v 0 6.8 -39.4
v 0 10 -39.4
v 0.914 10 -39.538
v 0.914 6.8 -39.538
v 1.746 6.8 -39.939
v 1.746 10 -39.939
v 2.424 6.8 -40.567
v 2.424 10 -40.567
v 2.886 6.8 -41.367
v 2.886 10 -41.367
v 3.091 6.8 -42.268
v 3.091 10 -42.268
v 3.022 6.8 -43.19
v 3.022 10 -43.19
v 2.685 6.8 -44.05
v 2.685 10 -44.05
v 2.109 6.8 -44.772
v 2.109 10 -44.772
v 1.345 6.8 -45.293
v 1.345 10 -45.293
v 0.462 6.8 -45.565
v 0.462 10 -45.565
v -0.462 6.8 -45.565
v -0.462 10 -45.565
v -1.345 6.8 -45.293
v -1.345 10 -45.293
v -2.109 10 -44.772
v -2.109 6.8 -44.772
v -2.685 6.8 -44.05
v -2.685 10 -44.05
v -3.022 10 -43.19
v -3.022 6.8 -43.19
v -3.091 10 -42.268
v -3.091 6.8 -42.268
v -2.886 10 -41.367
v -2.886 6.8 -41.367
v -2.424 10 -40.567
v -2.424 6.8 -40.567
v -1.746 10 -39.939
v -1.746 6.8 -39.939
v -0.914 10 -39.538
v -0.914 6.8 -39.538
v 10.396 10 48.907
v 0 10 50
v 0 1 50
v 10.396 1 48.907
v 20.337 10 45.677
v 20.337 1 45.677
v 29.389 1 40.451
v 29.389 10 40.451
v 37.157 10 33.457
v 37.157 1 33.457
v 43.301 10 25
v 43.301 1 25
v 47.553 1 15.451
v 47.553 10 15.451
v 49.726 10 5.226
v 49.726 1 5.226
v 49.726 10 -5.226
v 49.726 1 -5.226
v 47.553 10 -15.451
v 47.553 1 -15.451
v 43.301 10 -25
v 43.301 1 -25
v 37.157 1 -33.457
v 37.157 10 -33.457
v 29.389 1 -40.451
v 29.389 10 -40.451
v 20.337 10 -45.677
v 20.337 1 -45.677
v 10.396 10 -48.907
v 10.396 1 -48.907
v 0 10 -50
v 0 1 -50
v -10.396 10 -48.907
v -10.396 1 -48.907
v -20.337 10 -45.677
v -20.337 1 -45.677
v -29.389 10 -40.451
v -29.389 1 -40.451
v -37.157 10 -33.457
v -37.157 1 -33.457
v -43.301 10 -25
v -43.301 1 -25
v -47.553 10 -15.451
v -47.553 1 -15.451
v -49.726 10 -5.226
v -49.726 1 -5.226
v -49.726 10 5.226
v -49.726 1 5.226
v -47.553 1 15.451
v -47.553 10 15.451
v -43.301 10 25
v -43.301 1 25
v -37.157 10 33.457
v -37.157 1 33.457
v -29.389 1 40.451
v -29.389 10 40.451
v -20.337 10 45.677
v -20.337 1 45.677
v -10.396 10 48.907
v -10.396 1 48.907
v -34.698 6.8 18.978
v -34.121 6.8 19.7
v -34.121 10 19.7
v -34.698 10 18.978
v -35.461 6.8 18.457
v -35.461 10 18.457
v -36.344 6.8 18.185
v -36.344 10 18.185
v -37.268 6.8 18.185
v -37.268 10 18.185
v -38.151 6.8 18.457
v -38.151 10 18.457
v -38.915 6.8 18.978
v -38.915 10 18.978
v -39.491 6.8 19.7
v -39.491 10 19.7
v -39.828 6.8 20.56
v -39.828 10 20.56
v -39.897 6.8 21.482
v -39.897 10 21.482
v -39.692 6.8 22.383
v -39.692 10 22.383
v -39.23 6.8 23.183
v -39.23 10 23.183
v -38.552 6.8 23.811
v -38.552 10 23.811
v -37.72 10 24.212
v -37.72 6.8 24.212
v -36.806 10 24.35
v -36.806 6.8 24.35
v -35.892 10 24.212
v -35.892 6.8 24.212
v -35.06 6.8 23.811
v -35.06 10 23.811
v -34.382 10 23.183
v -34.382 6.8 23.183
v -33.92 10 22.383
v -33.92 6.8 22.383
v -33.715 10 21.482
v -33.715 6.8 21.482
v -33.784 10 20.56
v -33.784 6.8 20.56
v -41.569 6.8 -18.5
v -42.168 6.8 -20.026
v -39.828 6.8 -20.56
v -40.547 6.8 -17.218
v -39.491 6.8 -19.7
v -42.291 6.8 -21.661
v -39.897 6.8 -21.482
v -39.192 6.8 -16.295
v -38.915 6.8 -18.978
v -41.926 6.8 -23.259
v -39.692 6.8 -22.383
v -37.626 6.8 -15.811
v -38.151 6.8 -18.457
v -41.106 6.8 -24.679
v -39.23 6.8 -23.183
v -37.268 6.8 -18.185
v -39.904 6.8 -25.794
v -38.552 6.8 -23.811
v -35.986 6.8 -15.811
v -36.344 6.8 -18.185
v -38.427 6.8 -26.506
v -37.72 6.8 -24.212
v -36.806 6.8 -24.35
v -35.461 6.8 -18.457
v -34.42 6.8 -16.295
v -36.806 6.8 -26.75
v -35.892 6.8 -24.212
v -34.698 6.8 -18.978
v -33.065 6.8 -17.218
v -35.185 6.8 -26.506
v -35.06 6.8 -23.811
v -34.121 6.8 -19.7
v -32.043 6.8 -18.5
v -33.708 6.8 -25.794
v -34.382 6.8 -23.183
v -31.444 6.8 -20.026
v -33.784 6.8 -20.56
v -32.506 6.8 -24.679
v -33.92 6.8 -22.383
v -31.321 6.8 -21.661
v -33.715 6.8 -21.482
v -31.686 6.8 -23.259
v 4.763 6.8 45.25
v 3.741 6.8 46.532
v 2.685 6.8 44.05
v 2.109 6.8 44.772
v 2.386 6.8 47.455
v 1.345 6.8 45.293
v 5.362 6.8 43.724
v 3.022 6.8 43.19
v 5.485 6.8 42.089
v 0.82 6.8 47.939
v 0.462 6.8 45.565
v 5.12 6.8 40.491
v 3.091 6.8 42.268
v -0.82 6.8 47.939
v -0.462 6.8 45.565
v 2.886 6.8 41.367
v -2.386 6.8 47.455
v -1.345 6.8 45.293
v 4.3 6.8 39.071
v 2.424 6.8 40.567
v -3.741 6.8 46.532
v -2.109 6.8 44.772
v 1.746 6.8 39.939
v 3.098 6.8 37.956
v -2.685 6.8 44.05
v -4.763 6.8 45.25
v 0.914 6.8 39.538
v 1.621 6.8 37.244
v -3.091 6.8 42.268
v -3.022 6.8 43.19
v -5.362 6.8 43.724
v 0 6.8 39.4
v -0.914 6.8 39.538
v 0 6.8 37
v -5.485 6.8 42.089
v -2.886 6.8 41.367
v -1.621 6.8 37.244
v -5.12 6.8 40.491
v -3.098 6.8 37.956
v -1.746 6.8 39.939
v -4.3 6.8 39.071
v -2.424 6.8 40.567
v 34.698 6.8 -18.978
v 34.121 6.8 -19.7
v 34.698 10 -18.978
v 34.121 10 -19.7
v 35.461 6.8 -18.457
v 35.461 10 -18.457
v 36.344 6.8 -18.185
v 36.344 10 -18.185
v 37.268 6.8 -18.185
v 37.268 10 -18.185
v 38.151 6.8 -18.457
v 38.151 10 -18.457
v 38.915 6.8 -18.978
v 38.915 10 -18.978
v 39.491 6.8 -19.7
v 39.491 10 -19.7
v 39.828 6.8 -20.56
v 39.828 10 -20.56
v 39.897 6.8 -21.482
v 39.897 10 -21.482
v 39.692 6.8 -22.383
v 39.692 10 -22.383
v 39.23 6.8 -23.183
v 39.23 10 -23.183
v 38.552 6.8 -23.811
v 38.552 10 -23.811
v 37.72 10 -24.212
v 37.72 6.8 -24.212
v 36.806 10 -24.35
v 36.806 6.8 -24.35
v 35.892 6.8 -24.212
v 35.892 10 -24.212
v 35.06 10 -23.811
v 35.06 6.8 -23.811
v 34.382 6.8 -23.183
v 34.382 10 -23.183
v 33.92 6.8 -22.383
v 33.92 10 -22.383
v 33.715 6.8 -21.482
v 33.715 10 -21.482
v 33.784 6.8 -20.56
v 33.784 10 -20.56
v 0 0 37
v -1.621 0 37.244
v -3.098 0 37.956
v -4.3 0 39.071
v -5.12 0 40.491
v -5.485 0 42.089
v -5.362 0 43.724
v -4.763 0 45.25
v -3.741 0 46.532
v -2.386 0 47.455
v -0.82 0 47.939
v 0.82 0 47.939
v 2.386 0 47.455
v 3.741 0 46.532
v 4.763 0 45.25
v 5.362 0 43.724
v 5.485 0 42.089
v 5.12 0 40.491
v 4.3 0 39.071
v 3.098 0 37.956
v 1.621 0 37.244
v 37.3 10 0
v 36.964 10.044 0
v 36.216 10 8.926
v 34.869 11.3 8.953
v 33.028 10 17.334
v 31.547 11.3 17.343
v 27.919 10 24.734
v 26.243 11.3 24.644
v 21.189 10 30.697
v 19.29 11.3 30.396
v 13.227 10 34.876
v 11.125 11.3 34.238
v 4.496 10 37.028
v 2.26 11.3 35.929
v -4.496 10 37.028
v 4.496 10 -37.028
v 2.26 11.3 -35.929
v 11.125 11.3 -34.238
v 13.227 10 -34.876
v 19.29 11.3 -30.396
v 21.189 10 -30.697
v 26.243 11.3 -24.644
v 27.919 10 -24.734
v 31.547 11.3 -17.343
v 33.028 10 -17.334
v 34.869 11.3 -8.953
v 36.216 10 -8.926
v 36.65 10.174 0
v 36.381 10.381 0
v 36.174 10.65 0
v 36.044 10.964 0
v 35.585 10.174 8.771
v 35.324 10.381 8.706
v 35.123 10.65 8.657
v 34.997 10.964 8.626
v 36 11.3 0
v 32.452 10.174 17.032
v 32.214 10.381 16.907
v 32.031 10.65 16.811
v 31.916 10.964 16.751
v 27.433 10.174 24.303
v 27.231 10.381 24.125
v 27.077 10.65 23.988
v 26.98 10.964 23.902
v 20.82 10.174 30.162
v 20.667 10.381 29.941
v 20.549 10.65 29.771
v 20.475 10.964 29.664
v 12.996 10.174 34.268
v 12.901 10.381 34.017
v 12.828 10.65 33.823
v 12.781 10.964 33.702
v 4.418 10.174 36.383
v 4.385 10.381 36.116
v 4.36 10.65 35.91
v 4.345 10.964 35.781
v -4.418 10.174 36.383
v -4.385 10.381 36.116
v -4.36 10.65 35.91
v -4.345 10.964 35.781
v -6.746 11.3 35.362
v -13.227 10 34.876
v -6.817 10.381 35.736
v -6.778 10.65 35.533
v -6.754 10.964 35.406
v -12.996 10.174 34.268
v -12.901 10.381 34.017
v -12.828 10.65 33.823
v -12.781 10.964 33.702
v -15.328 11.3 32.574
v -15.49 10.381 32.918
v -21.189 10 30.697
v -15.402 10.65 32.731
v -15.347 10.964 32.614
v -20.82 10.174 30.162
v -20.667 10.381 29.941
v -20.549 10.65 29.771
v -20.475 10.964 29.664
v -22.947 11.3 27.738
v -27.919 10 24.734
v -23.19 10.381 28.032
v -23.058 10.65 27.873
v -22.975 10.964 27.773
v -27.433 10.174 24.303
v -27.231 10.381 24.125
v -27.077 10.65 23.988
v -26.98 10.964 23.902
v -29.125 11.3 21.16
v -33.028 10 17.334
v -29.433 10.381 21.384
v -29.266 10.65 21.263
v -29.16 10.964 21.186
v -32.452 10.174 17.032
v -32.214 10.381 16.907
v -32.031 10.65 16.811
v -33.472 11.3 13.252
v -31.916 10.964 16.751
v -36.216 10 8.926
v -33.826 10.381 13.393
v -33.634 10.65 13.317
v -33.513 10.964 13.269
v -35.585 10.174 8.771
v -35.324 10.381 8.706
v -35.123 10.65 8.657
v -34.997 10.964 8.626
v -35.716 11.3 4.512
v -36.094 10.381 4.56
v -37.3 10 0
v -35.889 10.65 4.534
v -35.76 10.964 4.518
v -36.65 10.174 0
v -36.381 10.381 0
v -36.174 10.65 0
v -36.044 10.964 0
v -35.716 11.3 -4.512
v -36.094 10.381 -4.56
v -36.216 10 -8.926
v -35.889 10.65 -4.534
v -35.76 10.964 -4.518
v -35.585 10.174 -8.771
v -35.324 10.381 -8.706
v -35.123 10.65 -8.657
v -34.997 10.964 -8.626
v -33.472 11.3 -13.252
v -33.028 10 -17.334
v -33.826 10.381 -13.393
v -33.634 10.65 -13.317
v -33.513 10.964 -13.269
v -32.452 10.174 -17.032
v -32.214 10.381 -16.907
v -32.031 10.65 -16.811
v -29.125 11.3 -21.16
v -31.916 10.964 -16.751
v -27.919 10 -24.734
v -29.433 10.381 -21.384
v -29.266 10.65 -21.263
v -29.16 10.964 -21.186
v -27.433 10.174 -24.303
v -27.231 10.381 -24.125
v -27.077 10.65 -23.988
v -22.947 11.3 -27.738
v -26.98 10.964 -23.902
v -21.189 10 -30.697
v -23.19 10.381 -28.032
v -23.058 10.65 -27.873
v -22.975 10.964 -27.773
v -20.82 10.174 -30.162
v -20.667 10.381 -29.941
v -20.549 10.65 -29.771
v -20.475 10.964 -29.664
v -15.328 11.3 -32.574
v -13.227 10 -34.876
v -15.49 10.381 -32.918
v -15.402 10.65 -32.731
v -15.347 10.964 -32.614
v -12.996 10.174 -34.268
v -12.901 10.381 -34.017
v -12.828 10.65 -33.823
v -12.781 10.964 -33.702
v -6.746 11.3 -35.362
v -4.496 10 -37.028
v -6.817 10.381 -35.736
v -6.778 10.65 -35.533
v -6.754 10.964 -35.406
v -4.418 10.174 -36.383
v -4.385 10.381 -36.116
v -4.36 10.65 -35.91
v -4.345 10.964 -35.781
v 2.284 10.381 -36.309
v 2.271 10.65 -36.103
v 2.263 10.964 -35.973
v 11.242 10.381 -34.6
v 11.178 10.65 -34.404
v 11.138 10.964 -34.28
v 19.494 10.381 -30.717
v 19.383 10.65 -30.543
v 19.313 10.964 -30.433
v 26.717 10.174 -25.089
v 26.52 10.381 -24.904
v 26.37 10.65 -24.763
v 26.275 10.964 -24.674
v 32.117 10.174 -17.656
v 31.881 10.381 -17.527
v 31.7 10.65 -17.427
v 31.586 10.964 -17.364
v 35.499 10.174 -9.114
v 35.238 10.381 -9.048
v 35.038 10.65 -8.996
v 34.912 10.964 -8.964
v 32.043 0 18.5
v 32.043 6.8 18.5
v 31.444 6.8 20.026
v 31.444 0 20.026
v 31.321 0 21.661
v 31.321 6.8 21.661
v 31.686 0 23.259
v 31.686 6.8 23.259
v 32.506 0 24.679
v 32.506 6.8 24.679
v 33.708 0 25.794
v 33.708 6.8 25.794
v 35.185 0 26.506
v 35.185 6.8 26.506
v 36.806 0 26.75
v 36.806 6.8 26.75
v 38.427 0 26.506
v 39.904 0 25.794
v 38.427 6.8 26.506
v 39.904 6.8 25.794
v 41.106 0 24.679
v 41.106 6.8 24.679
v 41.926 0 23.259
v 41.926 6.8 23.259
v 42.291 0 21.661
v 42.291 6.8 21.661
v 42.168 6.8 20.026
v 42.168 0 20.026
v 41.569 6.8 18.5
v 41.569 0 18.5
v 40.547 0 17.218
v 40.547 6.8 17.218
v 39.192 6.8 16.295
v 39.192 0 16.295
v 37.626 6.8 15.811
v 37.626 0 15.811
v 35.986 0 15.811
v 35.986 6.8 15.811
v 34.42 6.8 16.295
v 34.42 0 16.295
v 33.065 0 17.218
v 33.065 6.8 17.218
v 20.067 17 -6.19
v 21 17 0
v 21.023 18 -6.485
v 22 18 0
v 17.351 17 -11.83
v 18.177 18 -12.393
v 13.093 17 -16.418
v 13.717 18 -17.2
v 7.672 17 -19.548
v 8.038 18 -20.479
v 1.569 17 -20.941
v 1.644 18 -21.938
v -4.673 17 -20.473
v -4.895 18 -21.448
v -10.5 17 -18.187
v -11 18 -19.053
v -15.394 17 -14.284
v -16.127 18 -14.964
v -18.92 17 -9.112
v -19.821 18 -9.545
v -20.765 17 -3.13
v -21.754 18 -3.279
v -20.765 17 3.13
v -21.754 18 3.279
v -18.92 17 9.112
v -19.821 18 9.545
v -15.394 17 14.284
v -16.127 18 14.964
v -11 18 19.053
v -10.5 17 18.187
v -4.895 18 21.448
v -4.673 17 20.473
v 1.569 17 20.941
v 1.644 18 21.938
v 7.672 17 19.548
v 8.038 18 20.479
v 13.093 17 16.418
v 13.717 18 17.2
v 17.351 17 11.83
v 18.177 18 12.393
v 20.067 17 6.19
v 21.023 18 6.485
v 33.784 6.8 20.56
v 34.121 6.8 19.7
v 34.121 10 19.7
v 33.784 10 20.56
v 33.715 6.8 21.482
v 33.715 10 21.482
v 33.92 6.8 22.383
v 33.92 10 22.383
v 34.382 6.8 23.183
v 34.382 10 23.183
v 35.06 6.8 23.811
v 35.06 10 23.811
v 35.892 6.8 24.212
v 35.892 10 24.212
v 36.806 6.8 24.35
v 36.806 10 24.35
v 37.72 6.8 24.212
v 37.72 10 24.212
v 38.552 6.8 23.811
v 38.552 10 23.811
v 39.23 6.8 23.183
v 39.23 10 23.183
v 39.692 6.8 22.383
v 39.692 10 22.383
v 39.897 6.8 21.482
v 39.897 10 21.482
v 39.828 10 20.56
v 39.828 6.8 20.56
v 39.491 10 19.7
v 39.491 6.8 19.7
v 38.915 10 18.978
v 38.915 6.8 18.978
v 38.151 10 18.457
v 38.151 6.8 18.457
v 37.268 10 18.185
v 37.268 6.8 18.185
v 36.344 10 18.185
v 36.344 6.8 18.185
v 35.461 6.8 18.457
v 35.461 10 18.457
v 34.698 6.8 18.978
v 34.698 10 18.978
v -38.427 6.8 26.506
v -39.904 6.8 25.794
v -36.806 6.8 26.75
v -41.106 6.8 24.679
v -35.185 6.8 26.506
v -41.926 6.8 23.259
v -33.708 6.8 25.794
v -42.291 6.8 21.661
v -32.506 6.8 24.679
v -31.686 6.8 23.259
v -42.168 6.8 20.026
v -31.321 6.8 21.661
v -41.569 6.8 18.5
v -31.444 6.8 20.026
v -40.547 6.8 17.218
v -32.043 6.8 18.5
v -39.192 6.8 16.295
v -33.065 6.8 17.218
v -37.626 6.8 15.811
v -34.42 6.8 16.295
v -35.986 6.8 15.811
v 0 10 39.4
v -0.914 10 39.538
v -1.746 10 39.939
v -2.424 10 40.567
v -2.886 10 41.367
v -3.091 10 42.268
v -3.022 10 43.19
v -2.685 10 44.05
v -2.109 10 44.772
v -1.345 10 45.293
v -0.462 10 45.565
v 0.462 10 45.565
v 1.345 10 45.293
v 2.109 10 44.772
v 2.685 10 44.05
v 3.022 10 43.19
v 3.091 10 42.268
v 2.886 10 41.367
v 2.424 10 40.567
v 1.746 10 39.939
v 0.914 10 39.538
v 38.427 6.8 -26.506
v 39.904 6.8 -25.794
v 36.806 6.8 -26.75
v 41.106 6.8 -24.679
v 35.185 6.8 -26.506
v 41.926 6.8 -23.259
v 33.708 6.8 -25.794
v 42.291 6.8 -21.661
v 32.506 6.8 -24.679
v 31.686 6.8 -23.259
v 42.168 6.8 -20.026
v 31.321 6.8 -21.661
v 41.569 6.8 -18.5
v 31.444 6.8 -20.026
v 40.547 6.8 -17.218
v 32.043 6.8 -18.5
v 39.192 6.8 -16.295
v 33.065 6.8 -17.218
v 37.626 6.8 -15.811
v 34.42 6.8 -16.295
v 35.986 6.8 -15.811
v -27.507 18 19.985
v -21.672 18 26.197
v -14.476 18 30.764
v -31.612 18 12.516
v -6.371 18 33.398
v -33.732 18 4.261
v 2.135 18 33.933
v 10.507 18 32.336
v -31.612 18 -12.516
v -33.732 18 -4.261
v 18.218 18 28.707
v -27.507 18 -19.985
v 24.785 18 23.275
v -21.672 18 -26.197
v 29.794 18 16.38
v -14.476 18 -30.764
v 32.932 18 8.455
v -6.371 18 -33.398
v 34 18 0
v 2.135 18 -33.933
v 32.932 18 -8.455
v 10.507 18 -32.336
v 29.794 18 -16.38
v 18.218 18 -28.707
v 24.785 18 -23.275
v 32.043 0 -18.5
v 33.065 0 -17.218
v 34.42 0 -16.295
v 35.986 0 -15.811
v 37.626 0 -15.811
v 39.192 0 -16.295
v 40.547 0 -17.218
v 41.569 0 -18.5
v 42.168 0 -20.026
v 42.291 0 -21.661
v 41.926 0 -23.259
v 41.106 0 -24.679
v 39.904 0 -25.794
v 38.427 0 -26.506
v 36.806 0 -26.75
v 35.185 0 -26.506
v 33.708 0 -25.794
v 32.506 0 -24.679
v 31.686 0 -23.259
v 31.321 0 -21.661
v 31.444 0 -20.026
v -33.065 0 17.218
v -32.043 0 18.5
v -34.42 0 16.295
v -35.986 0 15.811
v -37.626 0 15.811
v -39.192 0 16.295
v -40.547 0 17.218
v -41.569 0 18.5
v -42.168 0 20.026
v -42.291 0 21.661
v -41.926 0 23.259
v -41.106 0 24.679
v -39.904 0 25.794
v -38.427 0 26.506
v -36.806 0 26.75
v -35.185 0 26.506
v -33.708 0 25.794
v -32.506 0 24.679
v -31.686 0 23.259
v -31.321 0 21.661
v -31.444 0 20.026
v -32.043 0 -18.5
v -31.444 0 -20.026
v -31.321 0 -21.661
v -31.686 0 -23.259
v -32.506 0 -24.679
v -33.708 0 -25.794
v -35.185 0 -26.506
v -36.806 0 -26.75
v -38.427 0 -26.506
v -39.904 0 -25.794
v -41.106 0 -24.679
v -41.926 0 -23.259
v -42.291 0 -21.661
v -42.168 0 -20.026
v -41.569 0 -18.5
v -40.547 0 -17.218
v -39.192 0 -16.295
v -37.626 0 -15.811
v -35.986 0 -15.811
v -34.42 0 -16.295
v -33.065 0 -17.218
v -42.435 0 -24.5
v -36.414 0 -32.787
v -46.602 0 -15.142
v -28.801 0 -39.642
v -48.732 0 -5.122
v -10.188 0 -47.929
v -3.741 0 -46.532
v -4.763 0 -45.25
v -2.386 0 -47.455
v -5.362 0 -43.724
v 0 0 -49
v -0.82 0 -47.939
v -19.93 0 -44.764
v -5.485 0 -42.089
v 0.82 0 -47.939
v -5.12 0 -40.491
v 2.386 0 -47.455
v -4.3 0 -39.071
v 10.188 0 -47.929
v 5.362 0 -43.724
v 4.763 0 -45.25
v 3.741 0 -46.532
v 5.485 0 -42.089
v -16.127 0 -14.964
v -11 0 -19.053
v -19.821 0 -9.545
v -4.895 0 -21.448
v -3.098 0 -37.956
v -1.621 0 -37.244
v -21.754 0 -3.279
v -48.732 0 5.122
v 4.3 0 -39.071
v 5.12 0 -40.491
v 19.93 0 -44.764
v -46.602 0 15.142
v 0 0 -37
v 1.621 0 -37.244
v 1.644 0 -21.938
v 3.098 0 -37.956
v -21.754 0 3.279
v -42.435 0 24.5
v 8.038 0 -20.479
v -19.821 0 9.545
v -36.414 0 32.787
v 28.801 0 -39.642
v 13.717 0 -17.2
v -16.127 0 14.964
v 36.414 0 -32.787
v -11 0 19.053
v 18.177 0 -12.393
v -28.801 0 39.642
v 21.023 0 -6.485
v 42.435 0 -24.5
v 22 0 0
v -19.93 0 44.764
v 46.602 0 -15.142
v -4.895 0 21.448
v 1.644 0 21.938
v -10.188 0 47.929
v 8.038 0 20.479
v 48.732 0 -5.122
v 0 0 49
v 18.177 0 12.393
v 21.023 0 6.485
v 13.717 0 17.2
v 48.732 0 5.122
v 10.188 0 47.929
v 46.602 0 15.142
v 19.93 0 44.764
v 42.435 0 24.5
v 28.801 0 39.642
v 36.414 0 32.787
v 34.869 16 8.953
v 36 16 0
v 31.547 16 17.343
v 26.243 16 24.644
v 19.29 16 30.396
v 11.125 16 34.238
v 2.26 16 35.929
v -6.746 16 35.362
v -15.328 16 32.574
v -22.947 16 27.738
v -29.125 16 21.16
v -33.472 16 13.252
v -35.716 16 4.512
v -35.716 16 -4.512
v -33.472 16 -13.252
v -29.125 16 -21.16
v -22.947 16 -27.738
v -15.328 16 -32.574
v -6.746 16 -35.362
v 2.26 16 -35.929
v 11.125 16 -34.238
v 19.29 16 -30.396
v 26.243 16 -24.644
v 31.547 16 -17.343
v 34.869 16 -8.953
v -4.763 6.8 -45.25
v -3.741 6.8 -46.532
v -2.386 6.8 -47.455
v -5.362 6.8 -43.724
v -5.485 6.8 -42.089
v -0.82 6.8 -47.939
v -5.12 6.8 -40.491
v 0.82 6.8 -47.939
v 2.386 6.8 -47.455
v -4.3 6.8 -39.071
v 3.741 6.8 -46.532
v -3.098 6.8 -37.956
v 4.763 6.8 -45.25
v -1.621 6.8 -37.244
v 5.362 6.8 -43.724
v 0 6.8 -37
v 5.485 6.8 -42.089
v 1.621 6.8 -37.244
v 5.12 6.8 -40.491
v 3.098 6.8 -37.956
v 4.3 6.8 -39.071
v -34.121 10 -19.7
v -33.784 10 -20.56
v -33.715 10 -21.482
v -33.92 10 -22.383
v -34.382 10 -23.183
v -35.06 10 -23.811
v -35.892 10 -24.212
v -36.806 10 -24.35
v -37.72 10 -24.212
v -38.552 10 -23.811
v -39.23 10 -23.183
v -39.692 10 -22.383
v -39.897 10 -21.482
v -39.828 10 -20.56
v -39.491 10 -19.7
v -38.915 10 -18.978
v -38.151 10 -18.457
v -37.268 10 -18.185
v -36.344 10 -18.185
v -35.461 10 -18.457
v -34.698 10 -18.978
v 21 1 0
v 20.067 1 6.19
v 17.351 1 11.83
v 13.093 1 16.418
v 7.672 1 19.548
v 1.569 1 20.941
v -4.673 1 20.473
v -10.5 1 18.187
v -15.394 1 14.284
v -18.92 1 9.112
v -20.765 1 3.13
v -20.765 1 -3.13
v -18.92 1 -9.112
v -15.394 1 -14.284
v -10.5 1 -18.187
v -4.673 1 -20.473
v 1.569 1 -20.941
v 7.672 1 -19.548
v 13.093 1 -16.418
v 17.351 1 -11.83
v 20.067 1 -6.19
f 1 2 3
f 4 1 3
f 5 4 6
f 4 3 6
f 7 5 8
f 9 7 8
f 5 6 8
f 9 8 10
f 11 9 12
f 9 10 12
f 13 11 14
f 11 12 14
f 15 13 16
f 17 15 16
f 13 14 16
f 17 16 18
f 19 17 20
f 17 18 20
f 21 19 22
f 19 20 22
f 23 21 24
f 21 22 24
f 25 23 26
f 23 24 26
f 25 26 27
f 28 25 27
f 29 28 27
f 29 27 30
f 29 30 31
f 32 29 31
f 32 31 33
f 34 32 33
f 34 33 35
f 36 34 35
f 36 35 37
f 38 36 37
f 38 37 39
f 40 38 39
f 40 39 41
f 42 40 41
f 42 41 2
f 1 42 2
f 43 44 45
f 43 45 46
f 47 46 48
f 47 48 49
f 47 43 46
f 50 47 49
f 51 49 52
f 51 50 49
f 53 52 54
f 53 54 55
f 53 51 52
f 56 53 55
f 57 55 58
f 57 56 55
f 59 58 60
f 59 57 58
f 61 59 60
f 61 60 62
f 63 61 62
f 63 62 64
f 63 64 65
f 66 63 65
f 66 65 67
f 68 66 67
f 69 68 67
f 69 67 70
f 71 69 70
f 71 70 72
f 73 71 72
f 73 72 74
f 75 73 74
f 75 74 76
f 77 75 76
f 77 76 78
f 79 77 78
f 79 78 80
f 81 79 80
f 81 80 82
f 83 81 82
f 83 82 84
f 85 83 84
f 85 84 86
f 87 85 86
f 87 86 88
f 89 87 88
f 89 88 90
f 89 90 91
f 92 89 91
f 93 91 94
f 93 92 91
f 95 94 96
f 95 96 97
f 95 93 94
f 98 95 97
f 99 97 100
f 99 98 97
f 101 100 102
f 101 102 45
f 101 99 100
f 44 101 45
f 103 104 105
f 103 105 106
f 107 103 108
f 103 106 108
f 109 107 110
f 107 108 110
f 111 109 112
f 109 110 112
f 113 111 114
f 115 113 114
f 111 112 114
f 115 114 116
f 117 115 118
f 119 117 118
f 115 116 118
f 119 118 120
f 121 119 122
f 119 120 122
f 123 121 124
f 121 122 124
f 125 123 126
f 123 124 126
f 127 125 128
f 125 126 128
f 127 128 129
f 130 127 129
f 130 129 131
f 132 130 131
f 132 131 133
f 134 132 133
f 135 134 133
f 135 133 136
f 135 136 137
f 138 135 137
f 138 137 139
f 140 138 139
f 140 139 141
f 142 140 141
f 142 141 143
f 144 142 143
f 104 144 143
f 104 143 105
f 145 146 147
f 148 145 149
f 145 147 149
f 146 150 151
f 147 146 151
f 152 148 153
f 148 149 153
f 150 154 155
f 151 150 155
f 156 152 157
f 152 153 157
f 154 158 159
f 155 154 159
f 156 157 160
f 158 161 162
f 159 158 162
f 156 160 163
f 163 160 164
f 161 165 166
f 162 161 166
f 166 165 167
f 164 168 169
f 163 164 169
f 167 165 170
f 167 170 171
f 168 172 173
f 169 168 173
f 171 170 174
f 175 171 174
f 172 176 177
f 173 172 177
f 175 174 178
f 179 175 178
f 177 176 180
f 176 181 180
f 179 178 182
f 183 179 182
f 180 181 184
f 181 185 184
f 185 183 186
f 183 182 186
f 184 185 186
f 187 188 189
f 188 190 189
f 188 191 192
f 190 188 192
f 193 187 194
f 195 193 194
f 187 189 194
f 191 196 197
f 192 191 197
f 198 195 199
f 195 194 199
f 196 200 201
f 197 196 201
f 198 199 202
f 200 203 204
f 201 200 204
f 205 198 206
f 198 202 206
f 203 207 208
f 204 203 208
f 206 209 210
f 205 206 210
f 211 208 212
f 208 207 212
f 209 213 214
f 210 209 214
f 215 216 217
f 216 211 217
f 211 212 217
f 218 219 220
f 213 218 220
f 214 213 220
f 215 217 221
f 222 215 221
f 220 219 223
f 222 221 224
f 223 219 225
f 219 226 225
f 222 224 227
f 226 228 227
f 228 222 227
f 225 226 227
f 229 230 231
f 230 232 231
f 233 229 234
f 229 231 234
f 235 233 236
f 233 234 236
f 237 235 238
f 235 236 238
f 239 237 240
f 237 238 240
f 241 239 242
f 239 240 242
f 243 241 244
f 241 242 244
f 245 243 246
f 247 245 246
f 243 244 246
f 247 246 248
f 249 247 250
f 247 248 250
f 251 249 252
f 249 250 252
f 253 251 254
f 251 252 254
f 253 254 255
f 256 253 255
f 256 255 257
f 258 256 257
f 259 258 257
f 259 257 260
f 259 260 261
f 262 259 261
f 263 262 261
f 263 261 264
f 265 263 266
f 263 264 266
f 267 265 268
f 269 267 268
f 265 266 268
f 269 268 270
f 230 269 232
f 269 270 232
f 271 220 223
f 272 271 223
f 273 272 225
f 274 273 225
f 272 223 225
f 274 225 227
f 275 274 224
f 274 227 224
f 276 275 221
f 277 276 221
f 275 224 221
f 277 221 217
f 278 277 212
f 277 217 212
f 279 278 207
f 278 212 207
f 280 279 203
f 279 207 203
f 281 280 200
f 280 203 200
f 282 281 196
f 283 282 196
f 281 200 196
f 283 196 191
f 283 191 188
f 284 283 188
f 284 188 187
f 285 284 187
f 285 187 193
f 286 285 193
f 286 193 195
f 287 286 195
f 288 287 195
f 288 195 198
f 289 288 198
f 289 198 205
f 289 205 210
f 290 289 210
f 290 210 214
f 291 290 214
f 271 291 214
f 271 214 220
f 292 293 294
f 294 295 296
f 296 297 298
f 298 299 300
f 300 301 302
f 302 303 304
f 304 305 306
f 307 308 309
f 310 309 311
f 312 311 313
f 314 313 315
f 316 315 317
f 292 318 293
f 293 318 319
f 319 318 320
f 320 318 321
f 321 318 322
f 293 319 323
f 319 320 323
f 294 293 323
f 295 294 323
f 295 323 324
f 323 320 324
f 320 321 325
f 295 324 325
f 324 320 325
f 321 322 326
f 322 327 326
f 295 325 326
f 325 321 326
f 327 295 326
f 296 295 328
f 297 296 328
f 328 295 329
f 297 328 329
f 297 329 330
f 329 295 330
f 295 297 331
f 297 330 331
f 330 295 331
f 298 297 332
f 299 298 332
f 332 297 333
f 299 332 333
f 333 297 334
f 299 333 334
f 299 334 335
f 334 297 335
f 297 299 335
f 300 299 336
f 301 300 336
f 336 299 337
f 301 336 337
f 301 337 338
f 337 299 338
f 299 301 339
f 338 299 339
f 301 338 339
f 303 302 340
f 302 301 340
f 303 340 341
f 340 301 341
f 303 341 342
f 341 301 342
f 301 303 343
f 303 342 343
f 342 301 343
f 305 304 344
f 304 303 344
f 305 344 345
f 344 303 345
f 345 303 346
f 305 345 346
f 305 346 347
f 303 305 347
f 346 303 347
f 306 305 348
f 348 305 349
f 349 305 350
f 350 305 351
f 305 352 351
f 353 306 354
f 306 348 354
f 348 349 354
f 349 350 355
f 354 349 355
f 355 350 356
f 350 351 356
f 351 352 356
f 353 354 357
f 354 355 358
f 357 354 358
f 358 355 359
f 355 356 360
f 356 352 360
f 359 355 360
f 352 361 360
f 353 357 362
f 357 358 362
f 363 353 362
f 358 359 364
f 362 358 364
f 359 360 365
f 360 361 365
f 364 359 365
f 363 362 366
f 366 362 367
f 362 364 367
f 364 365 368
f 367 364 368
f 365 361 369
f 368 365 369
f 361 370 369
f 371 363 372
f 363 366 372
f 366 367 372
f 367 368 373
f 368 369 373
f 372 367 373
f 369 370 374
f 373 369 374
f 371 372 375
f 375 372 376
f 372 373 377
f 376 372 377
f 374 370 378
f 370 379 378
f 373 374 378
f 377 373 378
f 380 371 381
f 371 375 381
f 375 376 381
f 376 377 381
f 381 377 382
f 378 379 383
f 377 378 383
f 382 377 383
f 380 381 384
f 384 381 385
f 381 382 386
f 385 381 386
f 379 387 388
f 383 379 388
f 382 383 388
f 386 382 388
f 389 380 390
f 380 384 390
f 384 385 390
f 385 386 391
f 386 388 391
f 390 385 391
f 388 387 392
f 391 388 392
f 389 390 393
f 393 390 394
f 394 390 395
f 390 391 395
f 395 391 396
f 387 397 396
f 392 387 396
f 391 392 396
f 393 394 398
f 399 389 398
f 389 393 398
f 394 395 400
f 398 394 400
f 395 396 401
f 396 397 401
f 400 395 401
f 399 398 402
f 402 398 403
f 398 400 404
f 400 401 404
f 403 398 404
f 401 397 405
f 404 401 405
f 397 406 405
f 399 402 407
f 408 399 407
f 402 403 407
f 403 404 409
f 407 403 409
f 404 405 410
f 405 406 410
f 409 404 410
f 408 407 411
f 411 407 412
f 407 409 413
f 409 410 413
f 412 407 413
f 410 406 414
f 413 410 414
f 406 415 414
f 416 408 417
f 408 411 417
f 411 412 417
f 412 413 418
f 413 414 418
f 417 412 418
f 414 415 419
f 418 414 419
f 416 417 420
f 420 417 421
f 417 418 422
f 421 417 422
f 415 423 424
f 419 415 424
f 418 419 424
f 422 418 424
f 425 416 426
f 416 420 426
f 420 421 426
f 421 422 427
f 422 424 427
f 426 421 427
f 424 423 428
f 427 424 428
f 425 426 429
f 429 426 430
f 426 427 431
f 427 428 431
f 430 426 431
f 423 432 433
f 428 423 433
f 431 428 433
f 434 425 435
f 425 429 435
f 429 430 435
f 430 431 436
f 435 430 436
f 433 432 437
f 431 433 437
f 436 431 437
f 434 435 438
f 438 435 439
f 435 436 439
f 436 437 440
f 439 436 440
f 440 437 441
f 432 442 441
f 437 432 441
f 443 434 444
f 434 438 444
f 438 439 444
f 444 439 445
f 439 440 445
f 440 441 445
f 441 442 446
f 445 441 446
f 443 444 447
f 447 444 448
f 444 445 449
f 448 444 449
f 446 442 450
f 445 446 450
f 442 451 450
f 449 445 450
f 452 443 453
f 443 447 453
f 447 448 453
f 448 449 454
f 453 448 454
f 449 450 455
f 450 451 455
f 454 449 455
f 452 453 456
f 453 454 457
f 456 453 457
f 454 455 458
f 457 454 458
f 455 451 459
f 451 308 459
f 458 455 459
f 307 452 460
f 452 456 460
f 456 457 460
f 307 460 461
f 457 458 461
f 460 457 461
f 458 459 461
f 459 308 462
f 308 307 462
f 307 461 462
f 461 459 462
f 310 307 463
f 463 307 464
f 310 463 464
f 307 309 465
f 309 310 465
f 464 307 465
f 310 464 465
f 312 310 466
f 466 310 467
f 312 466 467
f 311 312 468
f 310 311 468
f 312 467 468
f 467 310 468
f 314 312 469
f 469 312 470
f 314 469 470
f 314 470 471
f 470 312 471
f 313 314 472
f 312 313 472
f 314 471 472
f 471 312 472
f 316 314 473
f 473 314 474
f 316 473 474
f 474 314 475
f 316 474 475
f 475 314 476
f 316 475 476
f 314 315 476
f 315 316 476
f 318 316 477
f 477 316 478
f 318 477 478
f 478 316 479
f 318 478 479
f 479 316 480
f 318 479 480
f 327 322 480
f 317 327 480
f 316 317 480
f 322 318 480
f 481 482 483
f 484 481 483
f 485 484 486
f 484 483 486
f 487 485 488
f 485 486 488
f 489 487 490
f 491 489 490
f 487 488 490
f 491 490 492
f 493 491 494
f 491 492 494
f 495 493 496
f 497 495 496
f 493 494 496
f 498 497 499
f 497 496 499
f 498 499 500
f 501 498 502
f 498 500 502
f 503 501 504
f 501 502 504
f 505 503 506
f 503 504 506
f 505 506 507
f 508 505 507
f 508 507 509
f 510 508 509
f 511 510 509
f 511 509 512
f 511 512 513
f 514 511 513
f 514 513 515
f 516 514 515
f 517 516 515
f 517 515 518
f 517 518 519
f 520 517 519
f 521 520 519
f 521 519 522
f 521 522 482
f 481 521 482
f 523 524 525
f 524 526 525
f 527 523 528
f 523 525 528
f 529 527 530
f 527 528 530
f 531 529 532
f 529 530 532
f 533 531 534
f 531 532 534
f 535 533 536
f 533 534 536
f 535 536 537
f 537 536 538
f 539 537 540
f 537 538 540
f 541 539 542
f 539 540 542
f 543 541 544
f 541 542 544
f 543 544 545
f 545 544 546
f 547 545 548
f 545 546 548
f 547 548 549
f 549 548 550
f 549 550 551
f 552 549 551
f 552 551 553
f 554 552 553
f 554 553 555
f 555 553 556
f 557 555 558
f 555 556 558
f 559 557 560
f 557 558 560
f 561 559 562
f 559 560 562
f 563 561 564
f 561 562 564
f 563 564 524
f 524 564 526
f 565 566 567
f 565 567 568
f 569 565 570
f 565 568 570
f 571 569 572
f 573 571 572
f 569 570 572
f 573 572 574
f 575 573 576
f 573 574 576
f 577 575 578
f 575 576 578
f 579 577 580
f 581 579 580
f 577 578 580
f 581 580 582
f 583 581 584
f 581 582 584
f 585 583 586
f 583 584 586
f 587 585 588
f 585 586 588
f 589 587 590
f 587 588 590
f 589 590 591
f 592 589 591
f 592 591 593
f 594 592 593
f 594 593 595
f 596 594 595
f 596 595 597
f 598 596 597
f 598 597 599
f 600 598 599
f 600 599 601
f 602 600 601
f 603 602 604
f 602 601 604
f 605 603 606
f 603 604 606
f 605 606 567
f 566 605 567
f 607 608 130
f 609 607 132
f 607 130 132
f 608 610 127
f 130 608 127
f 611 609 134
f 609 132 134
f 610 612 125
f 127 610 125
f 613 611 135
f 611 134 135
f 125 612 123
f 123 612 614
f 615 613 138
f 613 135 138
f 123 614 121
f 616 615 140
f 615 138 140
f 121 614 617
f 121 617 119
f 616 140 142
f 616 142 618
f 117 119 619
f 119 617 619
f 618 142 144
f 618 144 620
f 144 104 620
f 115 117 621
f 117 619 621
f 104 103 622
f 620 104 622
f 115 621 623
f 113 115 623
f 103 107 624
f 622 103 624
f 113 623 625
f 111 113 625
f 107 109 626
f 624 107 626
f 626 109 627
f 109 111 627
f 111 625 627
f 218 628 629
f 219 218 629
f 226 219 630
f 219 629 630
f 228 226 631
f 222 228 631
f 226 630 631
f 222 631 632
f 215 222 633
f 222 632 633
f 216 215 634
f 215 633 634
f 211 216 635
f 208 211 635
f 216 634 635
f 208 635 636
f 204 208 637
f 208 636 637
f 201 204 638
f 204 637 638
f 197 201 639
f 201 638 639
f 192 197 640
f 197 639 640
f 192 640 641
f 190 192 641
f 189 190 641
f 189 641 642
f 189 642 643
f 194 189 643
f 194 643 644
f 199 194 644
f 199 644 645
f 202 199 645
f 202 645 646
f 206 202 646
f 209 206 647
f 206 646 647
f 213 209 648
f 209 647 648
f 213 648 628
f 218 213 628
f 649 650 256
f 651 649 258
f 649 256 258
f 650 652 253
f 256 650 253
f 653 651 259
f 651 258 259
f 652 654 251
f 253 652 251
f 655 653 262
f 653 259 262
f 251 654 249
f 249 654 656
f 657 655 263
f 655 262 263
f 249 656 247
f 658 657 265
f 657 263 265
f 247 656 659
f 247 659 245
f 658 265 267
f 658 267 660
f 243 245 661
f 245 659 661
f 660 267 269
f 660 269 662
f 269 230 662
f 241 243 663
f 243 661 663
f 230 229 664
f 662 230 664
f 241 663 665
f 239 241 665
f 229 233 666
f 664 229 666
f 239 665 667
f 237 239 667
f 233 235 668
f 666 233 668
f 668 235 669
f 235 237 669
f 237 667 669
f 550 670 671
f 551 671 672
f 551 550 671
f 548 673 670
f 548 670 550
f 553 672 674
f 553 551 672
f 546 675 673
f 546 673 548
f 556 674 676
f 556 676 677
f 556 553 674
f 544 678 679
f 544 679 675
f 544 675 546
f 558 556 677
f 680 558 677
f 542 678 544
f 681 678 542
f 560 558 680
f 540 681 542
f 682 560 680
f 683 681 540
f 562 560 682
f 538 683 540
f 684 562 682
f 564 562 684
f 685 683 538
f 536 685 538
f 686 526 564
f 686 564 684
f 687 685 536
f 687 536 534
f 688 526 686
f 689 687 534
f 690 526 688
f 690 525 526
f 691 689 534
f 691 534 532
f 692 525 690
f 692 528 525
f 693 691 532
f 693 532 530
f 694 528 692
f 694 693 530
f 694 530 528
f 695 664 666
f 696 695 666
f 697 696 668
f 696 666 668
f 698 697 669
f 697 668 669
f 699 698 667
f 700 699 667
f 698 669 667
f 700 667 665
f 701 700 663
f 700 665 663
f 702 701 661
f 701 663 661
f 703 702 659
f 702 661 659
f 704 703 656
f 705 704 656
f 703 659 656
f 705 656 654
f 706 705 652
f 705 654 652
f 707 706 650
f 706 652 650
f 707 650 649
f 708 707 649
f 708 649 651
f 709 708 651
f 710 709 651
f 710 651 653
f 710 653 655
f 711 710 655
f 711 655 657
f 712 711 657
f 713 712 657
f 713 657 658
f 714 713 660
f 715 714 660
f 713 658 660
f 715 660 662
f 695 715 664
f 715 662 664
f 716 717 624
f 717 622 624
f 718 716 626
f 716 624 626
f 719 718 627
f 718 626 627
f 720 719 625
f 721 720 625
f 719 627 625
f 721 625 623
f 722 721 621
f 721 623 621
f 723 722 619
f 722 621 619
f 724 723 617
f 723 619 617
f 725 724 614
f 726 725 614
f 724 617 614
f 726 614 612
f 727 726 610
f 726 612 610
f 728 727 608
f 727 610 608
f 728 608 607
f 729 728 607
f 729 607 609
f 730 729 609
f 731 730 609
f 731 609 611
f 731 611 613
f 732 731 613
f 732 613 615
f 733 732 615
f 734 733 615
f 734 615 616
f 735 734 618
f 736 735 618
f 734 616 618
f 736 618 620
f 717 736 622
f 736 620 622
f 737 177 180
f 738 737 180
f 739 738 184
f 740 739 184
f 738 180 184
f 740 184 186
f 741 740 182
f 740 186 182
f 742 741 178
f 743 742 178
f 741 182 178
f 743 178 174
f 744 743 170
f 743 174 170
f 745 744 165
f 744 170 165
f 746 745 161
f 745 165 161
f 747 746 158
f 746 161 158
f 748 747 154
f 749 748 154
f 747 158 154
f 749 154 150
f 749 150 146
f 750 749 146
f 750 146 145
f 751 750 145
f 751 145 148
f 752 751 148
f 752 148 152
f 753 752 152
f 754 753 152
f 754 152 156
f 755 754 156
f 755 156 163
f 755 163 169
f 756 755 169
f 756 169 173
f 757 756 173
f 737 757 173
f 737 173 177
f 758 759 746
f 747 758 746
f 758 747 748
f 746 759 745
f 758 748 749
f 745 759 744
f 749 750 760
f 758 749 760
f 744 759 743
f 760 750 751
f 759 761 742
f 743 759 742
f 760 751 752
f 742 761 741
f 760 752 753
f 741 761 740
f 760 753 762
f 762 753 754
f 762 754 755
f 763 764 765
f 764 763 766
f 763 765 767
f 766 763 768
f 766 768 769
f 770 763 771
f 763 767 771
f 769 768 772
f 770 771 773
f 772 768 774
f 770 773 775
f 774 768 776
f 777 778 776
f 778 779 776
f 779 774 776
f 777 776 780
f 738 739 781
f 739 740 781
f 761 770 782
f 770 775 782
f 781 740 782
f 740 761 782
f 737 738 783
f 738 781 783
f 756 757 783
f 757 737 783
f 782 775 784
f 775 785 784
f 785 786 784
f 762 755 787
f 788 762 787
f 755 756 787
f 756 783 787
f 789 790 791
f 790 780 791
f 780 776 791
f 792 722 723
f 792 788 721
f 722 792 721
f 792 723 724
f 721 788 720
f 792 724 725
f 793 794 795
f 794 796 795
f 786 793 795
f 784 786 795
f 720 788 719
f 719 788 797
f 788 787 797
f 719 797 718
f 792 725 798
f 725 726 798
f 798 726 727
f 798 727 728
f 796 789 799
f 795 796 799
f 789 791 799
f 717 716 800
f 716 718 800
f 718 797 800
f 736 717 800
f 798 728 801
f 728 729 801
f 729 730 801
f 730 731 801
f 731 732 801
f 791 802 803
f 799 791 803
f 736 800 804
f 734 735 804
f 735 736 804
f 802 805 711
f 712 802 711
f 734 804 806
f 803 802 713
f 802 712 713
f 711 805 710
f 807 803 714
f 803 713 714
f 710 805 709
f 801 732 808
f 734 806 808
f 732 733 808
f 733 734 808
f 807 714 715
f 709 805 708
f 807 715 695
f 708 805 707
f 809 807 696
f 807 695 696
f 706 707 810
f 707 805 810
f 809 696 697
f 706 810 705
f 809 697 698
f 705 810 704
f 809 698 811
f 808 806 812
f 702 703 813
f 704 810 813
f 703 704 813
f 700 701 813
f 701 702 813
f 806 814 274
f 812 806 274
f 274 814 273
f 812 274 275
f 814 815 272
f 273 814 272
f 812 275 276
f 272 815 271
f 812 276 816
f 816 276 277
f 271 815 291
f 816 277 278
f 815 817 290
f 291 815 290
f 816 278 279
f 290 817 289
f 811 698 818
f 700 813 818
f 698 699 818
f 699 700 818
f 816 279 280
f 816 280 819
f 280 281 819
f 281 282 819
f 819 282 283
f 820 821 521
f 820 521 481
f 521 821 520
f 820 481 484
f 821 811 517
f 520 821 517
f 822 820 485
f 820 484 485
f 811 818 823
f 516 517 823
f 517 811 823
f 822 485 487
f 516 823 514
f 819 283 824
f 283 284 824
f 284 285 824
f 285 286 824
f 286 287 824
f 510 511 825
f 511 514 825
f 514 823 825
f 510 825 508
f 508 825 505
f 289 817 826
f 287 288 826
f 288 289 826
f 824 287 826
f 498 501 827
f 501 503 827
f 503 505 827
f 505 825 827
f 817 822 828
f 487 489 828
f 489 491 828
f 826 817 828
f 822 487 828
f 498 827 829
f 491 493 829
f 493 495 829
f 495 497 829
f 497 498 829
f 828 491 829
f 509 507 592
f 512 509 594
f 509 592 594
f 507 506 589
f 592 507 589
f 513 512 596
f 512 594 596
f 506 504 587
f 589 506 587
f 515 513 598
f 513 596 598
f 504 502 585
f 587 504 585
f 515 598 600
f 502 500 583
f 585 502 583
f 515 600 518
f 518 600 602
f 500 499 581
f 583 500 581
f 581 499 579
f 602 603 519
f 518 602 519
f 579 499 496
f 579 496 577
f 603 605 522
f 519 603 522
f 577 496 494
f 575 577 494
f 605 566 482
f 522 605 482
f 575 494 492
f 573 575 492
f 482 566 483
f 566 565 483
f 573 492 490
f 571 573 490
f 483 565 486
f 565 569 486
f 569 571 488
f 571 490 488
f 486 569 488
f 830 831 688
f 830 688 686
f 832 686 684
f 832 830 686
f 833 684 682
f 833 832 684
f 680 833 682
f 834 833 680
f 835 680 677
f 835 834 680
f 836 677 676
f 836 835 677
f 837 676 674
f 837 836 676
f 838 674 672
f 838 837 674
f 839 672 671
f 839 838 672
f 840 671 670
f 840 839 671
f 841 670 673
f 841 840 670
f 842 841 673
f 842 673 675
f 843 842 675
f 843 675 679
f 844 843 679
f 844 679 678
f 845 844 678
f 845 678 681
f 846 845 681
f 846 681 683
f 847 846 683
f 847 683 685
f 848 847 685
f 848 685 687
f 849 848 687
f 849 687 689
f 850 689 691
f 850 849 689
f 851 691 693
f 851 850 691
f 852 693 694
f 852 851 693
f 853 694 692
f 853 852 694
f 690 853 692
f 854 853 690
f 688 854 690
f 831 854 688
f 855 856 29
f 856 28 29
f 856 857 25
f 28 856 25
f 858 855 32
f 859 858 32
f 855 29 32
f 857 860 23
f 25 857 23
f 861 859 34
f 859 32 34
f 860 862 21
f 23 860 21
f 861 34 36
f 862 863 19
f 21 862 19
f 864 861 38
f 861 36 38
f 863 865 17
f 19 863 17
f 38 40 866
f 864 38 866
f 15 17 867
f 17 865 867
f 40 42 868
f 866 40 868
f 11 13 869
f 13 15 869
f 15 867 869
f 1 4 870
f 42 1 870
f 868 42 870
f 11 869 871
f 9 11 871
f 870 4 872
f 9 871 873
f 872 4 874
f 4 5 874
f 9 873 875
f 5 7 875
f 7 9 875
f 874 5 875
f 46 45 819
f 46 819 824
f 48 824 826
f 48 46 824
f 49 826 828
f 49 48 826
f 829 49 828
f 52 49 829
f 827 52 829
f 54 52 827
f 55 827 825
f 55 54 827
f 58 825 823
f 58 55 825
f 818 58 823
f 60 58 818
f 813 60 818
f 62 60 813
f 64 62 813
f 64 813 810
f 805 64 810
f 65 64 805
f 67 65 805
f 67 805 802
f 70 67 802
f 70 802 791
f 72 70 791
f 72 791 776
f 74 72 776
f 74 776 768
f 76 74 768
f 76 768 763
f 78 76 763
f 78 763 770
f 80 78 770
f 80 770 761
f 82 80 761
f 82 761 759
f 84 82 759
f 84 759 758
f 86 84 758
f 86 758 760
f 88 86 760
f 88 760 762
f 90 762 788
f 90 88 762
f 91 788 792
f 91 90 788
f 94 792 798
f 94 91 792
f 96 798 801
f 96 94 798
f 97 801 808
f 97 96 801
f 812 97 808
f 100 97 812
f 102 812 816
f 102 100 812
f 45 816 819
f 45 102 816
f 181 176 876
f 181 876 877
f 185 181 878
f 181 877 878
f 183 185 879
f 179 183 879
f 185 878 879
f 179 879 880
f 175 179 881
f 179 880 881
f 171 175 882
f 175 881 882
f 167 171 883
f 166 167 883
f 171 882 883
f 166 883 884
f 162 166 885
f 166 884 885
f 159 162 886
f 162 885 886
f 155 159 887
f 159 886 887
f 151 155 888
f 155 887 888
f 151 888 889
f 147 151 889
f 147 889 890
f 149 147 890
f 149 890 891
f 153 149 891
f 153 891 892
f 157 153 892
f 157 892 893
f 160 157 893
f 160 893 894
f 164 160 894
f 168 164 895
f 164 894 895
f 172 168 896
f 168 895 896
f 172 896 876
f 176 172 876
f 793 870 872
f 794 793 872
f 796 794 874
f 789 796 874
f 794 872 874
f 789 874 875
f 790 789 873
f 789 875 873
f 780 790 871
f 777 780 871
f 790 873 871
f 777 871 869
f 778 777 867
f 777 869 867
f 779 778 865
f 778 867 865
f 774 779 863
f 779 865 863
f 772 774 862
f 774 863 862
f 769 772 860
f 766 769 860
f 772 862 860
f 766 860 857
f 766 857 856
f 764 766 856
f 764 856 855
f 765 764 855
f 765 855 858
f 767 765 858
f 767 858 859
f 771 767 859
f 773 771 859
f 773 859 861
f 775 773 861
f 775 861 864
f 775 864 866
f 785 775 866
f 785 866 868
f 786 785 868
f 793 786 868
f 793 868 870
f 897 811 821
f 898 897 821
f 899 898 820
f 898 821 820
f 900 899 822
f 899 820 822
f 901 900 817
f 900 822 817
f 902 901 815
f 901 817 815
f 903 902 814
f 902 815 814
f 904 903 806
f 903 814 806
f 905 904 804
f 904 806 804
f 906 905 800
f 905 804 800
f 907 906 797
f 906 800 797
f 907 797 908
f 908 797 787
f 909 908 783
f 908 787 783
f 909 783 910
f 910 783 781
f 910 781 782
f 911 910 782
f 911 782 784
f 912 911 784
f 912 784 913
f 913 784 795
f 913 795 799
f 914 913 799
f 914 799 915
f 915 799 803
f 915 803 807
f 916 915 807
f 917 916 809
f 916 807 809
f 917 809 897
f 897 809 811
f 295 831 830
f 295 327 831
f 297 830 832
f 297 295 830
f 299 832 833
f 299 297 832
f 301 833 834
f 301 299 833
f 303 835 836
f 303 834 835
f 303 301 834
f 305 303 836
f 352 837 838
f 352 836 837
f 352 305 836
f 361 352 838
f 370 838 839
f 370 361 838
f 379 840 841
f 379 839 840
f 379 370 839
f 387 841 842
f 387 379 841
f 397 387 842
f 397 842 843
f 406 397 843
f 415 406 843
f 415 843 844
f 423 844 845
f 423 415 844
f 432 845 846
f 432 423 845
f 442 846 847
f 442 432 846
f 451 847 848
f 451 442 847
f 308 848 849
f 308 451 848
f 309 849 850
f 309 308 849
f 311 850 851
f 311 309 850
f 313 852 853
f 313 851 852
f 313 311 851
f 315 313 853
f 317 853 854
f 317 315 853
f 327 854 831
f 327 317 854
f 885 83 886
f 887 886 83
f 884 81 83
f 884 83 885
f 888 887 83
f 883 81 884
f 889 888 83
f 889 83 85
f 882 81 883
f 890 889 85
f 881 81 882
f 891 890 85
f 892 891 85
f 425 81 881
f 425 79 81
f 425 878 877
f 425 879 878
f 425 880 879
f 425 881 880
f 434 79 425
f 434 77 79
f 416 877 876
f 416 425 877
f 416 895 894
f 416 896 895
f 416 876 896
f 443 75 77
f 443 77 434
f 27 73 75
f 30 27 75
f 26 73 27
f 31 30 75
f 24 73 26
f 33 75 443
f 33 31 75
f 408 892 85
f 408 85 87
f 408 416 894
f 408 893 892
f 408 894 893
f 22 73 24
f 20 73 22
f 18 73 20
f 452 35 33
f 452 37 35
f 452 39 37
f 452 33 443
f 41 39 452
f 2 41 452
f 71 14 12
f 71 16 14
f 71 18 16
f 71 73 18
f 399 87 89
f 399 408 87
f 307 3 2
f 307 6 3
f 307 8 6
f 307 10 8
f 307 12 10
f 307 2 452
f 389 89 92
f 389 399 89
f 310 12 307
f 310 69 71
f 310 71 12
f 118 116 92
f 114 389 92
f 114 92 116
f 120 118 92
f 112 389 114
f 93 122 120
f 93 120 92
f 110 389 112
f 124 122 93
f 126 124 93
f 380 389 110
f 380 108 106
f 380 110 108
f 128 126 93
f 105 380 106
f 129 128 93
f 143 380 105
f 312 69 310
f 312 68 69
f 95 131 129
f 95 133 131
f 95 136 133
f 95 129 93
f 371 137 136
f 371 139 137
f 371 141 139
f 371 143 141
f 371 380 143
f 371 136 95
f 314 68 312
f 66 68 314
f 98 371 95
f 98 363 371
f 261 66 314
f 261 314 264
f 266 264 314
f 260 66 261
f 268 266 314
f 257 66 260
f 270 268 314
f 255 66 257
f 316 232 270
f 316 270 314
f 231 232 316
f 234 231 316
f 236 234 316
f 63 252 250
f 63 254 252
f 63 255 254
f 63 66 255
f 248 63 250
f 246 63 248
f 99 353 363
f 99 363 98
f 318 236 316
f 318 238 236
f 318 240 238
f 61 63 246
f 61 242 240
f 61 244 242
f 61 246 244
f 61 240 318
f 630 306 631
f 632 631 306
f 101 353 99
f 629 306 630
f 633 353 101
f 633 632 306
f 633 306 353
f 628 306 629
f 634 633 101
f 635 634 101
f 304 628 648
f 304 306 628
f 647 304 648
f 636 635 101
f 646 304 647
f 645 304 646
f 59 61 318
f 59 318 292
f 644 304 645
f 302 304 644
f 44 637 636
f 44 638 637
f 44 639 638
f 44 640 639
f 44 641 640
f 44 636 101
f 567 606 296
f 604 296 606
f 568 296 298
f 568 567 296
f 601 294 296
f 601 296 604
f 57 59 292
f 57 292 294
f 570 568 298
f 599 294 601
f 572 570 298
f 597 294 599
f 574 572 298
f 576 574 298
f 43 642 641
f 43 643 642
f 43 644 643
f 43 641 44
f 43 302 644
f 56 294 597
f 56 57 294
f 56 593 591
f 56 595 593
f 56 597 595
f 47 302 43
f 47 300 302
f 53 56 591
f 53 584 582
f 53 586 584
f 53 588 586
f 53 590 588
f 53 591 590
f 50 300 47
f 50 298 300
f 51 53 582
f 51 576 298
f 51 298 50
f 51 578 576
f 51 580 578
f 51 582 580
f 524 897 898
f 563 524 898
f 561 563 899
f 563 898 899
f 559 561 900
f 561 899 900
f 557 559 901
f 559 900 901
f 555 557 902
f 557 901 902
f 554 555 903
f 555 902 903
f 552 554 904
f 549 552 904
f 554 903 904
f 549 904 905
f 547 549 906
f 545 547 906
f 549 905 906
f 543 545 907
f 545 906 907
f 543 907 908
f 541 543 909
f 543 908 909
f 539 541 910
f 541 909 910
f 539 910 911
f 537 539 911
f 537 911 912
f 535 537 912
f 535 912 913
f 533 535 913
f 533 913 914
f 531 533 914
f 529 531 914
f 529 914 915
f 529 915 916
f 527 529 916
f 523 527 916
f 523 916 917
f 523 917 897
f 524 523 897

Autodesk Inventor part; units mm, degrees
ref_plane "YZ Plane" through (0, 0, 0) normal (1, 0, 0) x (0, 1, 0)
ref_plane "XZ Plane" through (0, 0, 0) normal (0, 1, 0) x (-1, 0, 0)
ref_plane "XY Plane" through (0, 0, 0) normal (0, 0, 1) x (1, 0, 0)
sketch "Эскиз1" plane through (0, 0, 0) normal (0, 0, 1) x (1, 0, 0)
  line L0 (0, 5) -> (0, 0)
  line L1 (0, 0) -> (36, 0)
  line L2 (36, 0) -> (36, 10)
  line L3 (36, 10) -> (16, 10)
  line L4 (16, 10) -> (16, 5)
  line L5 (16, 5) -> (0, 5)
  dimension "d0" = 5
  dimension "d1" = 20
  dimension "d3" = 10
  dimension "d4" = 36
revolve "Вращение1" add sketch "Эскиз1" angle 360 about axis through (0, 5, 0) along (0, -1, 0)
sketch "Эскиз2" plane through (0, 0, 0) normal (1, 0, 0) x (0, 1, 0)
  line L0 (-2, 0) -> (12, 0) projected
  line L1 (0, -34) -> (0, 64) projected
  line L2 (0, 0) -> (0, 50)
  line L3 (0, 50) -> (10, 50)
  line L4 (10, 50) -> (10, 0)
  line L5 (0, 0) -> (10, 0)
  line L6 (10, 36) -> (0, 36) projected
  dimension "d6" = 10
  dimension "d7" = 50
revolve "Вращение2" add sketch "Эскиз2" angle 360 about axis through (0, -10, 0) along (0, 1, 0)
chamfer "Фаска1" distance 1 angle 45 1 edges at (0, 0, -50)
sketch "Эскиз3" plane through (0, 0, 0) normal (0, -1, 0) x (1, 0, 0)
  circle A0 centre (0, 0) radius 42.5 construction
  circle A1 centre (0, 42.5) radius 5.5
  line L0 (0, -70) -> (0, 70) projected
  line L1 (-70, 0) -> (70, 0) projected
  dimension "d10" = 85
  dimension "d9" = 11
hole "Отверстие1" at (0, 0, 42.5) direction (0, 1, 0) diameter 6.2 depth 15 tip angle 118 counterbore diameter 11 counterbore depth 6.8
pattern_circular "Круговой массив1" count 6 over 360 about axis through (0, -10, 0) along (0, 1, 0) of "Отверстие1"
sketch "Эскиз4" plane through (0, 10, 0) normal (0, 1, 0) x (1, 0, 0)
  circle A0 centre (0, 0) radius 36 projected
  circle A1 centre (0, 0) radius 16 projected
  circle A2 centre (0, 0) radius 16
  circle A3 centre (0, 0) radius 36
  dimension "d27" = 72
extrude "Выдавливание2" add sketch "Эскиз4" along normal blind 8
fillet "Сопряжение1" radius 1.3 1 edges at (-36, 10, 0)
sketch "Эскиз5" plane through (0, 0, 0) normal (0, -1, 0) x (1, 0, 0)
  line L0 (-70, 0) -> (70, 0) projected
  line L1 (0, 70) -> (0, -70) projected
  circle A0 centre (0, 0) radius 21
  dimension "d31" = 42
extrude "Выдавливание3" cut sketch "Эскиз5" against normal blind 50
chamfer "Фаска2" distance 1 angle 45 2 edges at (-21, 0, 0) (-21, 18, 0)
chamfer "Фаска3" distance 2 angle 45 1 edges at (-36, 18, 0)
properties part number "Крышка большая_ПОД МАНЖЕТУ"
